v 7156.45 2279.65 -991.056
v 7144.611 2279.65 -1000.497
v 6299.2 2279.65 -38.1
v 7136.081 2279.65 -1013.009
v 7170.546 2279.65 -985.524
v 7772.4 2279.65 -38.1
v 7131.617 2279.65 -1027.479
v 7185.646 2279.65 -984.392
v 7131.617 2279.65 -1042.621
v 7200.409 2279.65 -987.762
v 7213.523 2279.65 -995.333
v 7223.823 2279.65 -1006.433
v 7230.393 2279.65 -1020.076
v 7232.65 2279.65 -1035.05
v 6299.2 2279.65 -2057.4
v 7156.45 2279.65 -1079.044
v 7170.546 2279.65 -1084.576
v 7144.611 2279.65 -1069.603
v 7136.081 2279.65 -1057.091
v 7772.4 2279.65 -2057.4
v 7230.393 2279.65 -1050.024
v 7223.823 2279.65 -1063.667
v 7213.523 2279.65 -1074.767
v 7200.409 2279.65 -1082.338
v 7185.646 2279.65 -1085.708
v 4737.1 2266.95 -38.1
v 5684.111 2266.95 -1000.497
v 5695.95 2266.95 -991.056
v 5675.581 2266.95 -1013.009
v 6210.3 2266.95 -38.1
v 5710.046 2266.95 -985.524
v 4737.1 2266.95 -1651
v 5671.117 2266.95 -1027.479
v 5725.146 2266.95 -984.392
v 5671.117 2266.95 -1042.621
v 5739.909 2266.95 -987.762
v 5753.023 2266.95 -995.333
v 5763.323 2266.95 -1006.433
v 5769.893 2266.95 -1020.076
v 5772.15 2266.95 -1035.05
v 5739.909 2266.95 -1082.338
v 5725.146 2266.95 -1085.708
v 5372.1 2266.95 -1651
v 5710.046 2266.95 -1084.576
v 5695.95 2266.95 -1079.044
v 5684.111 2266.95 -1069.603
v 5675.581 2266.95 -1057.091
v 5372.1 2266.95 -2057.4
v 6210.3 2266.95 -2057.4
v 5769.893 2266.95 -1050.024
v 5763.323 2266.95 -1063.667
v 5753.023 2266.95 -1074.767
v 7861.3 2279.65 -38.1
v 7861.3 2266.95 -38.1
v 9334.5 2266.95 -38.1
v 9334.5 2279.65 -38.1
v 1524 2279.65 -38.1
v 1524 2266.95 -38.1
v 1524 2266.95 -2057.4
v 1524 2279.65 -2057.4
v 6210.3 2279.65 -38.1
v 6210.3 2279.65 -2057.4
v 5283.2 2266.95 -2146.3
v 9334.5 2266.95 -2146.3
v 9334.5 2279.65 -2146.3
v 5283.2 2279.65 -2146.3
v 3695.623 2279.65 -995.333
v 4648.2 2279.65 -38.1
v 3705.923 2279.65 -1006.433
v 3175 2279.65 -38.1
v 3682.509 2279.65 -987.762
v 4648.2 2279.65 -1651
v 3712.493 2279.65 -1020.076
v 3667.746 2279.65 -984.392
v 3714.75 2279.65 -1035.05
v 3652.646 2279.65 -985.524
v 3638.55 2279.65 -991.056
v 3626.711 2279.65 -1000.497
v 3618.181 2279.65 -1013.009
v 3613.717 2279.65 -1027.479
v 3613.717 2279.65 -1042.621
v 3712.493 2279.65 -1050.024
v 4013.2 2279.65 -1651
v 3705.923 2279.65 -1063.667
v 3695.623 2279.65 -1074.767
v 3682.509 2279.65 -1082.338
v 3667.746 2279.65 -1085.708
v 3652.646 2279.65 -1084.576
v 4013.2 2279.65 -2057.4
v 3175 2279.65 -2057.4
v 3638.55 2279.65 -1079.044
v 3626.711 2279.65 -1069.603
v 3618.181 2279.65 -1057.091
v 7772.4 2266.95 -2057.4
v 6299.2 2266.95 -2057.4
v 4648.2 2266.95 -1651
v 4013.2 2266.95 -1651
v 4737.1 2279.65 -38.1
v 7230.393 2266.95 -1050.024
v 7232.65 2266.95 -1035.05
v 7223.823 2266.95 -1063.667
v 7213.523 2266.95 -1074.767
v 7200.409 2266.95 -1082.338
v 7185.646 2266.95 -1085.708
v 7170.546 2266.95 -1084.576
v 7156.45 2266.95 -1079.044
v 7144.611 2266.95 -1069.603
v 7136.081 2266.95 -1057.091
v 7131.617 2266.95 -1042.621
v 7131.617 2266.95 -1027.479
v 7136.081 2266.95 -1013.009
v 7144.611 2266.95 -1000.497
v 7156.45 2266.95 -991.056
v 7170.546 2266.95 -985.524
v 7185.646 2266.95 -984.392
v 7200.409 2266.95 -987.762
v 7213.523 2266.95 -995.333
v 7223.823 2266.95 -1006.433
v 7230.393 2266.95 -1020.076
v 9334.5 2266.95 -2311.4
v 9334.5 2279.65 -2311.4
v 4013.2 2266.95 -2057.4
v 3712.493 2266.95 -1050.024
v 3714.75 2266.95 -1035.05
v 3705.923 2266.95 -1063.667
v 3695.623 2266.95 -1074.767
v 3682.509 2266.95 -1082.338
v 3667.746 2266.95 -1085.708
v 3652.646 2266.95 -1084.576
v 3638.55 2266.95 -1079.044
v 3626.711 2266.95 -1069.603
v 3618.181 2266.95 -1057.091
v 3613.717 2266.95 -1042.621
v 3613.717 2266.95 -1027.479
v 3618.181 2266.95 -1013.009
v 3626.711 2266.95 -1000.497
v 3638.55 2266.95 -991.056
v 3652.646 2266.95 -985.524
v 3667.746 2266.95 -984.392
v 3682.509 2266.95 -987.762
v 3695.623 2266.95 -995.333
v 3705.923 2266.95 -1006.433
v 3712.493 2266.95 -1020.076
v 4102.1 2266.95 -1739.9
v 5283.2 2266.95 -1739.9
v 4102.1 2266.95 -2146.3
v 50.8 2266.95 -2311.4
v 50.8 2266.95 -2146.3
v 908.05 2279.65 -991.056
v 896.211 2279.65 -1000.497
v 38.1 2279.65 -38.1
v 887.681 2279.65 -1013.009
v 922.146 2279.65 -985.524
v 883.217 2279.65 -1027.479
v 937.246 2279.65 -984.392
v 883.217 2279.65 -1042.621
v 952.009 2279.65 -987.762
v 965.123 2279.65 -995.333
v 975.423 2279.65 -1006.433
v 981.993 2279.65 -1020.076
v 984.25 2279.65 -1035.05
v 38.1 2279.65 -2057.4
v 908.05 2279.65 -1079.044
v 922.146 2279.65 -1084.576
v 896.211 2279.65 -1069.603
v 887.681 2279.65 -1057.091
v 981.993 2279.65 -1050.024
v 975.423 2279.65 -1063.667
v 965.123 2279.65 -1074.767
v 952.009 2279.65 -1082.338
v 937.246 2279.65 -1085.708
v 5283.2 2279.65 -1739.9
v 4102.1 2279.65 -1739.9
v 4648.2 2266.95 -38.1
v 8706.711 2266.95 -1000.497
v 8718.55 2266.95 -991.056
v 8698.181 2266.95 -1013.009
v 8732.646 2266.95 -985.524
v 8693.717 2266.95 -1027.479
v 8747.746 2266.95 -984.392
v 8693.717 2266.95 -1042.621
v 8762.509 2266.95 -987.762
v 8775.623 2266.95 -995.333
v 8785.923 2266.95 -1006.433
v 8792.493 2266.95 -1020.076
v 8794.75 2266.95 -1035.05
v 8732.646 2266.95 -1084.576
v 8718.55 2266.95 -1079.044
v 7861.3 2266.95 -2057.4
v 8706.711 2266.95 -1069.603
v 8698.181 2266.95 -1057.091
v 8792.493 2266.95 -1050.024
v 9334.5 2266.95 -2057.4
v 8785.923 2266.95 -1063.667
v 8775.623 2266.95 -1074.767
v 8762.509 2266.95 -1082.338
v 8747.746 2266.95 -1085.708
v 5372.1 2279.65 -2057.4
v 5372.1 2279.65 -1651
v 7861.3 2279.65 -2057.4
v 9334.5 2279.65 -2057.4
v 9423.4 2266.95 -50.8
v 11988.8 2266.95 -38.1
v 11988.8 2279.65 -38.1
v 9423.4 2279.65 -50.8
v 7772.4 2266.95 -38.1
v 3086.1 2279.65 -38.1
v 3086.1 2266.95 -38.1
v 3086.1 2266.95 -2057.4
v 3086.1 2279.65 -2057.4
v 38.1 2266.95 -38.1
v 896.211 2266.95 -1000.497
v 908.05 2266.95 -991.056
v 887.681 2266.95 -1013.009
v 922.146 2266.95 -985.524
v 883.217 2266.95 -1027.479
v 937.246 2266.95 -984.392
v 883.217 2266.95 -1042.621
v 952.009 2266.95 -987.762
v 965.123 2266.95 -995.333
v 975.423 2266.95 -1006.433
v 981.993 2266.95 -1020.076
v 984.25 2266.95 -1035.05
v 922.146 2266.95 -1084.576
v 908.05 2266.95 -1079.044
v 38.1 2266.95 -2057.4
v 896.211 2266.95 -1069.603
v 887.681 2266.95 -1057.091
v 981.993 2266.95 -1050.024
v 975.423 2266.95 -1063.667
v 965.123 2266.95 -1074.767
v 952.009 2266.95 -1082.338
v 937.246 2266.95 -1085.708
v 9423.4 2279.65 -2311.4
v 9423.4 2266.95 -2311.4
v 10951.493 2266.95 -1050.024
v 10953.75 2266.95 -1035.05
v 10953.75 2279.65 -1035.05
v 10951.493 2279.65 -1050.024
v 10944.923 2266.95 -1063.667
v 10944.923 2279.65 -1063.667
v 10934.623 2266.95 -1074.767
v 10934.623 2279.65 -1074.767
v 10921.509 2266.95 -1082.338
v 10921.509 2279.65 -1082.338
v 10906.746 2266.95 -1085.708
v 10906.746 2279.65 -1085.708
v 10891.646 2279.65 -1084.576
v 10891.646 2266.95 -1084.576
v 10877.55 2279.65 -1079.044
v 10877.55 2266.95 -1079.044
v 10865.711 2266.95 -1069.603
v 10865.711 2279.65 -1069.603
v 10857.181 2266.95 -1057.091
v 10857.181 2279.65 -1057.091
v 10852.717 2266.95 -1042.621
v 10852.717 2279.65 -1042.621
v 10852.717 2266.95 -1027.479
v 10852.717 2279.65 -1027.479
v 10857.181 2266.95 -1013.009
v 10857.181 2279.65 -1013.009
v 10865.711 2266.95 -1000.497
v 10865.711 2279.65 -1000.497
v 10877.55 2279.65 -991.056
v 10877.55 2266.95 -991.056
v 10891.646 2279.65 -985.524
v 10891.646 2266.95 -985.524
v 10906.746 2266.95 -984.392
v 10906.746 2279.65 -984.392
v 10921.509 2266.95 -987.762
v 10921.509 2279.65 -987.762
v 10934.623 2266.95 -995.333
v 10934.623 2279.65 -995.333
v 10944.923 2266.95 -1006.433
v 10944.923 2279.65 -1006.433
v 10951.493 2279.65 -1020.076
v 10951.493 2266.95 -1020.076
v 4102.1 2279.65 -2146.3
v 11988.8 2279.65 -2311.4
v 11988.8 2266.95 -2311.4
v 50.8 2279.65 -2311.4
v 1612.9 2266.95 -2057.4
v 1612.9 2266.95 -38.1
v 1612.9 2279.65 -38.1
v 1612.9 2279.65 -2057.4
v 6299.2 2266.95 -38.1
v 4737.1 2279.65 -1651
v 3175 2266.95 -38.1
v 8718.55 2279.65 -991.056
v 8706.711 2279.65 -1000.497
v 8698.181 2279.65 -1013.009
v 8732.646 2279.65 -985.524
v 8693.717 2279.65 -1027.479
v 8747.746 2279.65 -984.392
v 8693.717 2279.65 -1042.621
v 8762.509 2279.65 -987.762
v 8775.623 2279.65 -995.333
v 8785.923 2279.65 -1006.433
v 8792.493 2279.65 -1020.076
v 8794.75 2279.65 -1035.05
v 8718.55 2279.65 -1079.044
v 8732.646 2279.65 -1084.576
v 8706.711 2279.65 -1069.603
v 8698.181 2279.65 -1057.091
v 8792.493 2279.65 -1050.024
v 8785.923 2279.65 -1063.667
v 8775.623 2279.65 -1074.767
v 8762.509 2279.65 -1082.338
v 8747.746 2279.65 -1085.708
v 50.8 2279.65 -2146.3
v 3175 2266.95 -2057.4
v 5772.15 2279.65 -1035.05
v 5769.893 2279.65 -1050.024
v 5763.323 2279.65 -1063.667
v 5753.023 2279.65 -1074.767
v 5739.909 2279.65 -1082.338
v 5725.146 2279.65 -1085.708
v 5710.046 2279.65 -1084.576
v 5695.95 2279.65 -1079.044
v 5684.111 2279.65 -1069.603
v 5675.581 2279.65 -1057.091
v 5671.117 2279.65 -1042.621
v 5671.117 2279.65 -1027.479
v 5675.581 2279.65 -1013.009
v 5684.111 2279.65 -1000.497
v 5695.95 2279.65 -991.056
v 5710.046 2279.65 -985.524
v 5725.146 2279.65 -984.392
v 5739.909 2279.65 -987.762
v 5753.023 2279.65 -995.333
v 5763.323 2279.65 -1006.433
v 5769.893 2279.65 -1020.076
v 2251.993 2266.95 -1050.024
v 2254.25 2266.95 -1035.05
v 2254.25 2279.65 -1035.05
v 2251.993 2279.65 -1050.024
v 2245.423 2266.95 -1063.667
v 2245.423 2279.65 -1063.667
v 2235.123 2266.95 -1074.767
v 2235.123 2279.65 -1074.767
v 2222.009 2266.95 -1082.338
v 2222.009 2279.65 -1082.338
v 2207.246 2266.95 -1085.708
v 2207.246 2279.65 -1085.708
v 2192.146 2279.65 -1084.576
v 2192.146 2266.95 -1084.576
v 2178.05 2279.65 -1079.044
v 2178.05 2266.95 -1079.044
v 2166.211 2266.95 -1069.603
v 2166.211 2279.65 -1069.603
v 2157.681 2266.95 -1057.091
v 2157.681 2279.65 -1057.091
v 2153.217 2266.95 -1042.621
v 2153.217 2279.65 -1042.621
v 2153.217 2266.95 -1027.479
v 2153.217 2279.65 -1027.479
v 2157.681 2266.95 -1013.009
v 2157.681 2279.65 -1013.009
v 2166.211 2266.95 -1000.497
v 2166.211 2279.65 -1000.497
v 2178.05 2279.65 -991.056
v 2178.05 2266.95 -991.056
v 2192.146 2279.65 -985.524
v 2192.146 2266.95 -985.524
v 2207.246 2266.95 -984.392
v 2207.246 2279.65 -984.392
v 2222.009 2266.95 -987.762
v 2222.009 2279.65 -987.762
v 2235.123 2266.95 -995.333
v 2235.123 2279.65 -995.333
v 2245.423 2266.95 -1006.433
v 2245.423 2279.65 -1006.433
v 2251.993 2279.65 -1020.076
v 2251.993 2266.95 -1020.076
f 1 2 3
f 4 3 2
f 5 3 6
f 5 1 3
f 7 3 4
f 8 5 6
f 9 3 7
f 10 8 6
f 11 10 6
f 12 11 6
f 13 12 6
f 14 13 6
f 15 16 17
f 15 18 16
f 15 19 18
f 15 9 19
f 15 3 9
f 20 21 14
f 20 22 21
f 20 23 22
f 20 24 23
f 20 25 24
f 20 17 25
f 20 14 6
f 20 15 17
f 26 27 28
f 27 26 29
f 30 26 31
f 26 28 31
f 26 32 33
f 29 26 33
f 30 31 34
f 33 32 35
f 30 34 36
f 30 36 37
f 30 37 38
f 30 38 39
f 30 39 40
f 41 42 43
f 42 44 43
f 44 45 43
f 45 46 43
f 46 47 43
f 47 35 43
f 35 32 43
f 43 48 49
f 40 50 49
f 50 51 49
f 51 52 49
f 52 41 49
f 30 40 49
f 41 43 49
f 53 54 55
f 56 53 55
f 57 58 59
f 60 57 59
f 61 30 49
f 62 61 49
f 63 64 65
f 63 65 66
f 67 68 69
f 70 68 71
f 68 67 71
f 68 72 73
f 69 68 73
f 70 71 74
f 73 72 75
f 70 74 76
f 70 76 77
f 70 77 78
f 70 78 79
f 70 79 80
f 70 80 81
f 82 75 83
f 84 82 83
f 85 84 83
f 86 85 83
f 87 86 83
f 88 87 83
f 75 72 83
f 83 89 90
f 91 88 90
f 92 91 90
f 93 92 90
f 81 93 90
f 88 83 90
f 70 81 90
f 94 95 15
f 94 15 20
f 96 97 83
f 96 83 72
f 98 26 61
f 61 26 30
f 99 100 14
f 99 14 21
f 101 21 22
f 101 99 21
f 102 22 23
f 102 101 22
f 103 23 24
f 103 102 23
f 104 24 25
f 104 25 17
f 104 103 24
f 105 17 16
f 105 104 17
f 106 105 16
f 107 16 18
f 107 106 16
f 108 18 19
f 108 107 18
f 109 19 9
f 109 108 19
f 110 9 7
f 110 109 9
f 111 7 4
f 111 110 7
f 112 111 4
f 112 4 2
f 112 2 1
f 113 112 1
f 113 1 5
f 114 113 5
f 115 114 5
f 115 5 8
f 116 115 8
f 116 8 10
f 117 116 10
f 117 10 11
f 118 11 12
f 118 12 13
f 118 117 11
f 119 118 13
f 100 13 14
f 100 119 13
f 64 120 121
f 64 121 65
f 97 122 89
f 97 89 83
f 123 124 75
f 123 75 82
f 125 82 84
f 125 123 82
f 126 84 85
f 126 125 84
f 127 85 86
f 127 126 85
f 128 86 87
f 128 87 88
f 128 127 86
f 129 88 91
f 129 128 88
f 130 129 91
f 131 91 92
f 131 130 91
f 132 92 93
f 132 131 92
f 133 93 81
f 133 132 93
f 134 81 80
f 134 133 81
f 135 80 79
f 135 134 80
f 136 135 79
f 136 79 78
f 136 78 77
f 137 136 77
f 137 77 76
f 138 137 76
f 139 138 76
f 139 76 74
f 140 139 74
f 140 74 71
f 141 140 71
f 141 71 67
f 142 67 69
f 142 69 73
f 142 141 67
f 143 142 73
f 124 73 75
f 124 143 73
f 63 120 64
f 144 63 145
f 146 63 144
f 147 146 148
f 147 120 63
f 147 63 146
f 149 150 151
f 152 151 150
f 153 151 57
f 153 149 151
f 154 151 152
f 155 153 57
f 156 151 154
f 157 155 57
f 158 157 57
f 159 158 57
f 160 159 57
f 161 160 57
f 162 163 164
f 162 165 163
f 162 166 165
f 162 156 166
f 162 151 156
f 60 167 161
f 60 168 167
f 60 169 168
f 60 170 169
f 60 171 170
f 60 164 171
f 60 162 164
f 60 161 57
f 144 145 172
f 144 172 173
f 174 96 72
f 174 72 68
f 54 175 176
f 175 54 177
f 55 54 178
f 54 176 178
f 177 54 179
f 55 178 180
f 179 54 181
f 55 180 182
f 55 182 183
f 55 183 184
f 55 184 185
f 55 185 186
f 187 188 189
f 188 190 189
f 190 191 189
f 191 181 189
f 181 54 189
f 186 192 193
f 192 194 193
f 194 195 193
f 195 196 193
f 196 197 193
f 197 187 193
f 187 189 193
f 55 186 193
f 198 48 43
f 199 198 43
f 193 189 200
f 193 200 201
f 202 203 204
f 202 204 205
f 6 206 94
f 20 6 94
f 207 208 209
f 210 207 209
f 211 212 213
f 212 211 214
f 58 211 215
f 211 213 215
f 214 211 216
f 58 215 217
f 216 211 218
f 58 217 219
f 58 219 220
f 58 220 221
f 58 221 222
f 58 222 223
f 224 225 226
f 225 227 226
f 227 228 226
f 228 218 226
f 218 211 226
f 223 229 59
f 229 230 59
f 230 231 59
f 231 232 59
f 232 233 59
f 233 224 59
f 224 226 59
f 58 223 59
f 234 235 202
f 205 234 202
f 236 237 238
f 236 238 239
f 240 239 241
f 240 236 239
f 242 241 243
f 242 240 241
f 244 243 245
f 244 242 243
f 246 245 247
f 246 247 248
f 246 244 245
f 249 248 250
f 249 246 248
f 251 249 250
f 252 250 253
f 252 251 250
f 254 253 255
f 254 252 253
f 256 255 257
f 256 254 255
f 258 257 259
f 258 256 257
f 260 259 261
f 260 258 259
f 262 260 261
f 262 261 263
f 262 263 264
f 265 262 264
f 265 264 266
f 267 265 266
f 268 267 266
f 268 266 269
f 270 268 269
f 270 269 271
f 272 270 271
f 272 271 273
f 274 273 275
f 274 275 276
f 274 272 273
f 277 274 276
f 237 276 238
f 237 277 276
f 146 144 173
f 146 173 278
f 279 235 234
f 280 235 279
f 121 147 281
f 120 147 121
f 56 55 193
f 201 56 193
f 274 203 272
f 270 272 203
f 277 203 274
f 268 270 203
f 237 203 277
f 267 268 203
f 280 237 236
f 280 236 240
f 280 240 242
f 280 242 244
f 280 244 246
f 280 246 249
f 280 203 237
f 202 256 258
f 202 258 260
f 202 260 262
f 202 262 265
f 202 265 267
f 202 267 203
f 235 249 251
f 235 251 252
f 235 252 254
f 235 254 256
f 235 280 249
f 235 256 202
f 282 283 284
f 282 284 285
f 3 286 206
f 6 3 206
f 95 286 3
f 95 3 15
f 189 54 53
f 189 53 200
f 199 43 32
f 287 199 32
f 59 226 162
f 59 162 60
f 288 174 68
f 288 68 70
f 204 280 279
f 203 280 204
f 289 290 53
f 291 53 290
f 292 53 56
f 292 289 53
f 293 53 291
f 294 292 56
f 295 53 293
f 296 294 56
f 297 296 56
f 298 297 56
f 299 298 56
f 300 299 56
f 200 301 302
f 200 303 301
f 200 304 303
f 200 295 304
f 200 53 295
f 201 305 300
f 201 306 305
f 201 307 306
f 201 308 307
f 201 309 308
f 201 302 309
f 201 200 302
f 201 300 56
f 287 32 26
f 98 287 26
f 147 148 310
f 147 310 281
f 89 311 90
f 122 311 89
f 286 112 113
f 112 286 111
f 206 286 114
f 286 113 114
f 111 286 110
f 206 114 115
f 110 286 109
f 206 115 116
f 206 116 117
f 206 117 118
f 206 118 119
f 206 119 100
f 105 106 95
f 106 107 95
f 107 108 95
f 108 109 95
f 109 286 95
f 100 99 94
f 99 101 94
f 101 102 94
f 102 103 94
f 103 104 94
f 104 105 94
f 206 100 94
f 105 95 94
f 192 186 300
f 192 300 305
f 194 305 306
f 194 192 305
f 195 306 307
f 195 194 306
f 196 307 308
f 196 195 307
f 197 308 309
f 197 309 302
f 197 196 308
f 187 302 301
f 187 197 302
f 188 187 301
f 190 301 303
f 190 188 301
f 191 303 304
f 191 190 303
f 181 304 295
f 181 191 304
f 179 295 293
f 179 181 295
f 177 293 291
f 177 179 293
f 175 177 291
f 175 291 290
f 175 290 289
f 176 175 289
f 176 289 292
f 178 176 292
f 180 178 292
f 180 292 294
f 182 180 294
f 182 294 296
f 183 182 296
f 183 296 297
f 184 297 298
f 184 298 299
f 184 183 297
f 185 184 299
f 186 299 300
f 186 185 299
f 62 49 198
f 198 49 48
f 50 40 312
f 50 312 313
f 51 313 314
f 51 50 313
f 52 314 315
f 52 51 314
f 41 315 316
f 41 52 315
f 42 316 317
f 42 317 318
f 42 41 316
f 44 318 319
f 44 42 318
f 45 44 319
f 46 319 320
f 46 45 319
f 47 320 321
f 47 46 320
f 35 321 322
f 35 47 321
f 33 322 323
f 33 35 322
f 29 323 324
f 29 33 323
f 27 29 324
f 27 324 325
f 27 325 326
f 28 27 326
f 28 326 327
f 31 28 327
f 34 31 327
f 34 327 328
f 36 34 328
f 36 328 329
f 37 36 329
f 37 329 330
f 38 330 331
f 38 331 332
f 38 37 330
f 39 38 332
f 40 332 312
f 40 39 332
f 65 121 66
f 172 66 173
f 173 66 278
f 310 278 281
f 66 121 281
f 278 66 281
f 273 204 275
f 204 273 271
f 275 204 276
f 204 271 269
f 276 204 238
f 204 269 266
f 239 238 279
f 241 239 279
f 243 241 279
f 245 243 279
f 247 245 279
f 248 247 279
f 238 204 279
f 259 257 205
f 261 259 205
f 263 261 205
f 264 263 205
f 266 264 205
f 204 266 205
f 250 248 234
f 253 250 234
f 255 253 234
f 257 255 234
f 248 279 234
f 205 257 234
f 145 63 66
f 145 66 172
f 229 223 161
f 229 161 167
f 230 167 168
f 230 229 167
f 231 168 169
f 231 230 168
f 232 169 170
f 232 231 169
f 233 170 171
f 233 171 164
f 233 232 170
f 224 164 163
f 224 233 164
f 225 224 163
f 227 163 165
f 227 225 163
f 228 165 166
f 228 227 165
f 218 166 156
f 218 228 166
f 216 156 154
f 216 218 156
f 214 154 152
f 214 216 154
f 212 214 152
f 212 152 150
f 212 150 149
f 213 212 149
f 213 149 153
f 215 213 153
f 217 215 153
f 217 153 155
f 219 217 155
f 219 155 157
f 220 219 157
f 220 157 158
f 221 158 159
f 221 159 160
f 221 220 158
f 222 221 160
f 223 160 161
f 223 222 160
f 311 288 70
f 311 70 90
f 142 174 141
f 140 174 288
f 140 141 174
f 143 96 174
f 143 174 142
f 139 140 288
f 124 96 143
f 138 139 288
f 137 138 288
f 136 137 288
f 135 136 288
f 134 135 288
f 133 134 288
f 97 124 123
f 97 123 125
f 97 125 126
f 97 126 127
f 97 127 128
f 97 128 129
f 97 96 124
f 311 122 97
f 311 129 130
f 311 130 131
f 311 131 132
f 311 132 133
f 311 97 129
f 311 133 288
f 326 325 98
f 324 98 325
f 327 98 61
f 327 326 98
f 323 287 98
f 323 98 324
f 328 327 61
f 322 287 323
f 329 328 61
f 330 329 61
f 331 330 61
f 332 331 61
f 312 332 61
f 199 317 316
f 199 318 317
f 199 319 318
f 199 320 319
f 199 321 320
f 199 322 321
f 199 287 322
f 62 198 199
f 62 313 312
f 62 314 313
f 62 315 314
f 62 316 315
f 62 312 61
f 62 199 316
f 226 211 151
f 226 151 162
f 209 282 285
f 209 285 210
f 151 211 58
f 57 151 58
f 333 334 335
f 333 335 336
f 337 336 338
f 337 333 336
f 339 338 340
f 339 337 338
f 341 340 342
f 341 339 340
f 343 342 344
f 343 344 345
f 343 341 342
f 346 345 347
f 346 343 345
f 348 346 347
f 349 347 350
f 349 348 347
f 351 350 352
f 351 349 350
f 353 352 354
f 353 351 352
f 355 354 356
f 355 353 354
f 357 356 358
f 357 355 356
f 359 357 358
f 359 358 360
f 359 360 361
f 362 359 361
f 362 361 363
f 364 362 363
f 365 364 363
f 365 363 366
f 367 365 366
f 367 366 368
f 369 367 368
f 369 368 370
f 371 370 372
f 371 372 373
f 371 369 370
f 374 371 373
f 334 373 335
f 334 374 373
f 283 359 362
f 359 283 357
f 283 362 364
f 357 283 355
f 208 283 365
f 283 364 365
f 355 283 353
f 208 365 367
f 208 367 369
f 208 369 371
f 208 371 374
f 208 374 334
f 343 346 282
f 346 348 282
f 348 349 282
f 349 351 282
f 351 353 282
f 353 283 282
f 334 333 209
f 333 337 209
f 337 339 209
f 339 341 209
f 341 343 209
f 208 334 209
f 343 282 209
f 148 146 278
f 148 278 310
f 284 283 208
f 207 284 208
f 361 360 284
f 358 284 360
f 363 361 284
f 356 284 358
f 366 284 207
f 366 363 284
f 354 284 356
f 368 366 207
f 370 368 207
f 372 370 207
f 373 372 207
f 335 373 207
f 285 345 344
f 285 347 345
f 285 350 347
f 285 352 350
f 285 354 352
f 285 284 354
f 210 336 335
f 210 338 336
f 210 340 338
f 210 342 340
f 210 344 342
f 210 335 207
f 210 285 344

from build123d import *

# Parameters (mm, degrees)
SKETCH1_W             = 1485.9
SKETCH1_H             = 2019.3
BOSS_EXTRUDE1_DEPTH   = 12.7
SKETCH1_W_2           = 1473.2
BOSS_EXTRUDE1_2_DEPTH = 12.7
BOSS_EXTRUDE1_3_DEPTH = 12.7
BOSS_EXTRUDE1_4_DEPTH = 12.7
BOSS_EXTRUDE1_5_DEPTH = 12.7
BOSS_EXTRUDE1_6_DEPTH = 12.7
BOSS_EXTRUDE1_7_DEPTH = 12.7
BOSS_EXTRUDE1_8_DEPTH = 12.7
SKETCH3_R             = 50.8
CUT_EXTRUDE1_DEPTH    = 12.7


with BuildPart() as part:
    # Sketch1 → Boss-Extrude1 (new body)
    with BuildSketch(Plane(origin=(0, 2266.95, 0), x_dir=(1, 0, 0), z_dir=(0, 1, 0))):
        with Locations((781.05, 1047.75)):
            Rectangle(SKETCH1_W, SKETCH1_H)
    extrude(amount=BOSS_EXTRUDE1_DEPTH)


with BuildPart() as body_2:
    # Sketch1 → Boss-Extrude1 2 (new body)
    with BuildSketch(Plane(origin=(0, 2266.95, 0), x_dir=(1, 0, 0), z_dir=(0, 1, 0))):
        with Locations((2349.5, 1047.75)):
            Rectangle(SKETCH1_W_2, SKETCH1_H)
    extrude(amount=BOSS_EXTRUDE1_2_DEPTH)


with BuildPart() as body_3:
    # Sketch1 → Boss-Extrude1 3 (new body)
    with BuildSketch(Plane(origin=(0, 2266.95, 0), x_dir=(1, 0, 0), z_dir=(0, 1, 0))):
        Polygon((4102.1, 2146.3), (50.8, 2146.3), (50.8, 2311.4), (9334.5, 2311.4), (9334.5, 2146.3), (5283.2, 2146.3), (5283.2, 1739.9), (4102.1, 1739.9), align=None)
    extrude(amount=BOSS_EXTRUDE1_3_DEPTH)


with BuildPart() as body_4:
    # Sketch1 → Boss-Extrude1 4 (new body)
    with BuildSketch(Plane(origin=(0, 2266.95, 0), x_dir=(1, 0, 0), z_dir=(0, 1, 0))):
        Polygon((3175, 38.1), (3175, 2057.4), (4013.2, 2057.4), (4013.2, 1651), (4648.2, 1651), (4648.2, 38.1), align=None)
    extrude(amount=BOSS_EXTRUDE1_4_DEPTH)


with BuildPart() as body_5:
    # Sketch1 → Boss-Extrude1 5 (new body)
    with BuildSketch(Plane(origin=(0, 2266.95, 0), x_dir=(1, 0, 0), z_dir=(0, 1, 0))):
        Polygon((5372.1, 2057.4), (5372.1, 1651), (4737.1, 1651), (4737.1, 38.1), (6210.3, 38.1), (6210.3, 2057.4), align=None)
    extrude(amount=BOSS_EXTRUDE1_5_DEPTH)


with BuildPart() as body_6:
    # Sketch1 → Boss-Extrude1 6 (new body)
    with BuildSketch(Plane(origin=(0, 2266.95, 0), x_dir=(1, 0, 0), z_dir=(0, 1, 0))):
        with Locations((7035.8, 1047.75)):
            Rectangle(SKETCH1_W_2, SKETCH1_H)
    extrude(amount=BOSS_EXTRUDE1_6_DEPTH)


with BuildPart() as body_7:
    # Sketch1 → Boss-Extrude1 7 (new body)
    with BuildSketch(Plane(origin=(0, 2266.95, 0), x_dir=(1, 0, 0), z_dir=(0, 1, 0))):
        with Locations((8597.9, 1047.75)):
            Rectangle(SKETCH1_W_2, SKETCH1_H)
    extrude(amount=BOSS_EXTRUDE1_7_DEPTH)


with BuildPart() as body_8:
    # Sketch1 → Boss-Extrude1 8 (new body)
    with BuildSketch(Plane(origin=(0, 2266.95, 0), x_dir=(1, 0, 0), z_dir=(0, 1, 0))):
        Polygon((9423.4, 50.8), (9423.4, 2146.3), (9423.4, 2311.4), (11988.8, 2311.4), (11988.8, 38.1), align=None)
    extrude(amount=BOSS_EXTRUDE1_8_DEPTH)


with BuildPart() as cut_extrude1_tool:
    # Sketch3 → Cut-Extrude1 (new body)
    with BuildSketch(Plane(origin=(0, 2266.95, 0), x_dir=(1, 0, 0), z_dir=(0, 1, 0))):
        with Locations((933.45, 1035.05)):
            Circle(SKETCH3_R)
        with Locations((2203.45, 1035.05)):
            Circle(SKETCH3_R)
        with Locations((5721.35, 1035.05)):
            Circle(SKETCH3_R)
        with Locations((3663.95, 1035.05)):
            Circle(SKETCH3_R)
        with Locations((7181.85, 1035.05)):
            Circle(SKETCH3_R)
        with Locations((8743.95, 1035.05)):
            Circle(SKETCH3_R)
        with Locations((10902.95, 1035.05)):
            Circle(SKETCH3_R)
    extrude(amount=CUT_EXTRUDE1_DEPTH)


with BuildPart() as part_1:
    add(part.part)

    # Cut-Extrude1: cut by cut_extrude1_tool
    add(cut_extrude1_tool.part, mode=Mode.SUBTRACT)


with BuildPart() as body_2_1:
    add(body_2.part)

    # Cut-Extrude1: cut by cut_extrude1_tool
    add(cut_extrude1_tool.part, mode=Mode.SUBTRACT)


with BuildPart() as body_4_1:
    add(body_4.part)

    # Cut-Extrude1: cut by cut_extrude1_tool
    add(cut_extrude1_tool.part, mode=Mode.SUBTRACT)


with BuildPart() as body_5_1:
    add(body_5.part)

    # Cut-Extrude1: cut by cut_extrude1_tool
    add(cut_extrude1_tool.part, mode=Mode.SUBTRACT)


with BuildPart() as body_6_1:
    add(body_6.part)

    # Cut-Extrude1: cut by cut_extrude1_tool
    add(cut_extrude1_tool.part, mode=Mode.SUBTRACT)


with BuildPart() as body_7_1:
    add(body_7.part)

    # Cut-Extrude1: cut by cut_extrude1_tool
    add(cut_extrude1_tool.part, mode=Mode.SUBTRACT)


with BuildPart() as body_8_1:
    add(body_8.part)

    # Cut-Extrude1: cut by cut_extrude1_tool
    add(cut_extrude1_tool.part, mode=Mode.SUBTRACT)


solid = Compound([body_3.part, part_1.part, body_2_1.part, body_4_1.part, body_5_1.part, body_6_1.part, body_7_1.part, body_8_1.part])
